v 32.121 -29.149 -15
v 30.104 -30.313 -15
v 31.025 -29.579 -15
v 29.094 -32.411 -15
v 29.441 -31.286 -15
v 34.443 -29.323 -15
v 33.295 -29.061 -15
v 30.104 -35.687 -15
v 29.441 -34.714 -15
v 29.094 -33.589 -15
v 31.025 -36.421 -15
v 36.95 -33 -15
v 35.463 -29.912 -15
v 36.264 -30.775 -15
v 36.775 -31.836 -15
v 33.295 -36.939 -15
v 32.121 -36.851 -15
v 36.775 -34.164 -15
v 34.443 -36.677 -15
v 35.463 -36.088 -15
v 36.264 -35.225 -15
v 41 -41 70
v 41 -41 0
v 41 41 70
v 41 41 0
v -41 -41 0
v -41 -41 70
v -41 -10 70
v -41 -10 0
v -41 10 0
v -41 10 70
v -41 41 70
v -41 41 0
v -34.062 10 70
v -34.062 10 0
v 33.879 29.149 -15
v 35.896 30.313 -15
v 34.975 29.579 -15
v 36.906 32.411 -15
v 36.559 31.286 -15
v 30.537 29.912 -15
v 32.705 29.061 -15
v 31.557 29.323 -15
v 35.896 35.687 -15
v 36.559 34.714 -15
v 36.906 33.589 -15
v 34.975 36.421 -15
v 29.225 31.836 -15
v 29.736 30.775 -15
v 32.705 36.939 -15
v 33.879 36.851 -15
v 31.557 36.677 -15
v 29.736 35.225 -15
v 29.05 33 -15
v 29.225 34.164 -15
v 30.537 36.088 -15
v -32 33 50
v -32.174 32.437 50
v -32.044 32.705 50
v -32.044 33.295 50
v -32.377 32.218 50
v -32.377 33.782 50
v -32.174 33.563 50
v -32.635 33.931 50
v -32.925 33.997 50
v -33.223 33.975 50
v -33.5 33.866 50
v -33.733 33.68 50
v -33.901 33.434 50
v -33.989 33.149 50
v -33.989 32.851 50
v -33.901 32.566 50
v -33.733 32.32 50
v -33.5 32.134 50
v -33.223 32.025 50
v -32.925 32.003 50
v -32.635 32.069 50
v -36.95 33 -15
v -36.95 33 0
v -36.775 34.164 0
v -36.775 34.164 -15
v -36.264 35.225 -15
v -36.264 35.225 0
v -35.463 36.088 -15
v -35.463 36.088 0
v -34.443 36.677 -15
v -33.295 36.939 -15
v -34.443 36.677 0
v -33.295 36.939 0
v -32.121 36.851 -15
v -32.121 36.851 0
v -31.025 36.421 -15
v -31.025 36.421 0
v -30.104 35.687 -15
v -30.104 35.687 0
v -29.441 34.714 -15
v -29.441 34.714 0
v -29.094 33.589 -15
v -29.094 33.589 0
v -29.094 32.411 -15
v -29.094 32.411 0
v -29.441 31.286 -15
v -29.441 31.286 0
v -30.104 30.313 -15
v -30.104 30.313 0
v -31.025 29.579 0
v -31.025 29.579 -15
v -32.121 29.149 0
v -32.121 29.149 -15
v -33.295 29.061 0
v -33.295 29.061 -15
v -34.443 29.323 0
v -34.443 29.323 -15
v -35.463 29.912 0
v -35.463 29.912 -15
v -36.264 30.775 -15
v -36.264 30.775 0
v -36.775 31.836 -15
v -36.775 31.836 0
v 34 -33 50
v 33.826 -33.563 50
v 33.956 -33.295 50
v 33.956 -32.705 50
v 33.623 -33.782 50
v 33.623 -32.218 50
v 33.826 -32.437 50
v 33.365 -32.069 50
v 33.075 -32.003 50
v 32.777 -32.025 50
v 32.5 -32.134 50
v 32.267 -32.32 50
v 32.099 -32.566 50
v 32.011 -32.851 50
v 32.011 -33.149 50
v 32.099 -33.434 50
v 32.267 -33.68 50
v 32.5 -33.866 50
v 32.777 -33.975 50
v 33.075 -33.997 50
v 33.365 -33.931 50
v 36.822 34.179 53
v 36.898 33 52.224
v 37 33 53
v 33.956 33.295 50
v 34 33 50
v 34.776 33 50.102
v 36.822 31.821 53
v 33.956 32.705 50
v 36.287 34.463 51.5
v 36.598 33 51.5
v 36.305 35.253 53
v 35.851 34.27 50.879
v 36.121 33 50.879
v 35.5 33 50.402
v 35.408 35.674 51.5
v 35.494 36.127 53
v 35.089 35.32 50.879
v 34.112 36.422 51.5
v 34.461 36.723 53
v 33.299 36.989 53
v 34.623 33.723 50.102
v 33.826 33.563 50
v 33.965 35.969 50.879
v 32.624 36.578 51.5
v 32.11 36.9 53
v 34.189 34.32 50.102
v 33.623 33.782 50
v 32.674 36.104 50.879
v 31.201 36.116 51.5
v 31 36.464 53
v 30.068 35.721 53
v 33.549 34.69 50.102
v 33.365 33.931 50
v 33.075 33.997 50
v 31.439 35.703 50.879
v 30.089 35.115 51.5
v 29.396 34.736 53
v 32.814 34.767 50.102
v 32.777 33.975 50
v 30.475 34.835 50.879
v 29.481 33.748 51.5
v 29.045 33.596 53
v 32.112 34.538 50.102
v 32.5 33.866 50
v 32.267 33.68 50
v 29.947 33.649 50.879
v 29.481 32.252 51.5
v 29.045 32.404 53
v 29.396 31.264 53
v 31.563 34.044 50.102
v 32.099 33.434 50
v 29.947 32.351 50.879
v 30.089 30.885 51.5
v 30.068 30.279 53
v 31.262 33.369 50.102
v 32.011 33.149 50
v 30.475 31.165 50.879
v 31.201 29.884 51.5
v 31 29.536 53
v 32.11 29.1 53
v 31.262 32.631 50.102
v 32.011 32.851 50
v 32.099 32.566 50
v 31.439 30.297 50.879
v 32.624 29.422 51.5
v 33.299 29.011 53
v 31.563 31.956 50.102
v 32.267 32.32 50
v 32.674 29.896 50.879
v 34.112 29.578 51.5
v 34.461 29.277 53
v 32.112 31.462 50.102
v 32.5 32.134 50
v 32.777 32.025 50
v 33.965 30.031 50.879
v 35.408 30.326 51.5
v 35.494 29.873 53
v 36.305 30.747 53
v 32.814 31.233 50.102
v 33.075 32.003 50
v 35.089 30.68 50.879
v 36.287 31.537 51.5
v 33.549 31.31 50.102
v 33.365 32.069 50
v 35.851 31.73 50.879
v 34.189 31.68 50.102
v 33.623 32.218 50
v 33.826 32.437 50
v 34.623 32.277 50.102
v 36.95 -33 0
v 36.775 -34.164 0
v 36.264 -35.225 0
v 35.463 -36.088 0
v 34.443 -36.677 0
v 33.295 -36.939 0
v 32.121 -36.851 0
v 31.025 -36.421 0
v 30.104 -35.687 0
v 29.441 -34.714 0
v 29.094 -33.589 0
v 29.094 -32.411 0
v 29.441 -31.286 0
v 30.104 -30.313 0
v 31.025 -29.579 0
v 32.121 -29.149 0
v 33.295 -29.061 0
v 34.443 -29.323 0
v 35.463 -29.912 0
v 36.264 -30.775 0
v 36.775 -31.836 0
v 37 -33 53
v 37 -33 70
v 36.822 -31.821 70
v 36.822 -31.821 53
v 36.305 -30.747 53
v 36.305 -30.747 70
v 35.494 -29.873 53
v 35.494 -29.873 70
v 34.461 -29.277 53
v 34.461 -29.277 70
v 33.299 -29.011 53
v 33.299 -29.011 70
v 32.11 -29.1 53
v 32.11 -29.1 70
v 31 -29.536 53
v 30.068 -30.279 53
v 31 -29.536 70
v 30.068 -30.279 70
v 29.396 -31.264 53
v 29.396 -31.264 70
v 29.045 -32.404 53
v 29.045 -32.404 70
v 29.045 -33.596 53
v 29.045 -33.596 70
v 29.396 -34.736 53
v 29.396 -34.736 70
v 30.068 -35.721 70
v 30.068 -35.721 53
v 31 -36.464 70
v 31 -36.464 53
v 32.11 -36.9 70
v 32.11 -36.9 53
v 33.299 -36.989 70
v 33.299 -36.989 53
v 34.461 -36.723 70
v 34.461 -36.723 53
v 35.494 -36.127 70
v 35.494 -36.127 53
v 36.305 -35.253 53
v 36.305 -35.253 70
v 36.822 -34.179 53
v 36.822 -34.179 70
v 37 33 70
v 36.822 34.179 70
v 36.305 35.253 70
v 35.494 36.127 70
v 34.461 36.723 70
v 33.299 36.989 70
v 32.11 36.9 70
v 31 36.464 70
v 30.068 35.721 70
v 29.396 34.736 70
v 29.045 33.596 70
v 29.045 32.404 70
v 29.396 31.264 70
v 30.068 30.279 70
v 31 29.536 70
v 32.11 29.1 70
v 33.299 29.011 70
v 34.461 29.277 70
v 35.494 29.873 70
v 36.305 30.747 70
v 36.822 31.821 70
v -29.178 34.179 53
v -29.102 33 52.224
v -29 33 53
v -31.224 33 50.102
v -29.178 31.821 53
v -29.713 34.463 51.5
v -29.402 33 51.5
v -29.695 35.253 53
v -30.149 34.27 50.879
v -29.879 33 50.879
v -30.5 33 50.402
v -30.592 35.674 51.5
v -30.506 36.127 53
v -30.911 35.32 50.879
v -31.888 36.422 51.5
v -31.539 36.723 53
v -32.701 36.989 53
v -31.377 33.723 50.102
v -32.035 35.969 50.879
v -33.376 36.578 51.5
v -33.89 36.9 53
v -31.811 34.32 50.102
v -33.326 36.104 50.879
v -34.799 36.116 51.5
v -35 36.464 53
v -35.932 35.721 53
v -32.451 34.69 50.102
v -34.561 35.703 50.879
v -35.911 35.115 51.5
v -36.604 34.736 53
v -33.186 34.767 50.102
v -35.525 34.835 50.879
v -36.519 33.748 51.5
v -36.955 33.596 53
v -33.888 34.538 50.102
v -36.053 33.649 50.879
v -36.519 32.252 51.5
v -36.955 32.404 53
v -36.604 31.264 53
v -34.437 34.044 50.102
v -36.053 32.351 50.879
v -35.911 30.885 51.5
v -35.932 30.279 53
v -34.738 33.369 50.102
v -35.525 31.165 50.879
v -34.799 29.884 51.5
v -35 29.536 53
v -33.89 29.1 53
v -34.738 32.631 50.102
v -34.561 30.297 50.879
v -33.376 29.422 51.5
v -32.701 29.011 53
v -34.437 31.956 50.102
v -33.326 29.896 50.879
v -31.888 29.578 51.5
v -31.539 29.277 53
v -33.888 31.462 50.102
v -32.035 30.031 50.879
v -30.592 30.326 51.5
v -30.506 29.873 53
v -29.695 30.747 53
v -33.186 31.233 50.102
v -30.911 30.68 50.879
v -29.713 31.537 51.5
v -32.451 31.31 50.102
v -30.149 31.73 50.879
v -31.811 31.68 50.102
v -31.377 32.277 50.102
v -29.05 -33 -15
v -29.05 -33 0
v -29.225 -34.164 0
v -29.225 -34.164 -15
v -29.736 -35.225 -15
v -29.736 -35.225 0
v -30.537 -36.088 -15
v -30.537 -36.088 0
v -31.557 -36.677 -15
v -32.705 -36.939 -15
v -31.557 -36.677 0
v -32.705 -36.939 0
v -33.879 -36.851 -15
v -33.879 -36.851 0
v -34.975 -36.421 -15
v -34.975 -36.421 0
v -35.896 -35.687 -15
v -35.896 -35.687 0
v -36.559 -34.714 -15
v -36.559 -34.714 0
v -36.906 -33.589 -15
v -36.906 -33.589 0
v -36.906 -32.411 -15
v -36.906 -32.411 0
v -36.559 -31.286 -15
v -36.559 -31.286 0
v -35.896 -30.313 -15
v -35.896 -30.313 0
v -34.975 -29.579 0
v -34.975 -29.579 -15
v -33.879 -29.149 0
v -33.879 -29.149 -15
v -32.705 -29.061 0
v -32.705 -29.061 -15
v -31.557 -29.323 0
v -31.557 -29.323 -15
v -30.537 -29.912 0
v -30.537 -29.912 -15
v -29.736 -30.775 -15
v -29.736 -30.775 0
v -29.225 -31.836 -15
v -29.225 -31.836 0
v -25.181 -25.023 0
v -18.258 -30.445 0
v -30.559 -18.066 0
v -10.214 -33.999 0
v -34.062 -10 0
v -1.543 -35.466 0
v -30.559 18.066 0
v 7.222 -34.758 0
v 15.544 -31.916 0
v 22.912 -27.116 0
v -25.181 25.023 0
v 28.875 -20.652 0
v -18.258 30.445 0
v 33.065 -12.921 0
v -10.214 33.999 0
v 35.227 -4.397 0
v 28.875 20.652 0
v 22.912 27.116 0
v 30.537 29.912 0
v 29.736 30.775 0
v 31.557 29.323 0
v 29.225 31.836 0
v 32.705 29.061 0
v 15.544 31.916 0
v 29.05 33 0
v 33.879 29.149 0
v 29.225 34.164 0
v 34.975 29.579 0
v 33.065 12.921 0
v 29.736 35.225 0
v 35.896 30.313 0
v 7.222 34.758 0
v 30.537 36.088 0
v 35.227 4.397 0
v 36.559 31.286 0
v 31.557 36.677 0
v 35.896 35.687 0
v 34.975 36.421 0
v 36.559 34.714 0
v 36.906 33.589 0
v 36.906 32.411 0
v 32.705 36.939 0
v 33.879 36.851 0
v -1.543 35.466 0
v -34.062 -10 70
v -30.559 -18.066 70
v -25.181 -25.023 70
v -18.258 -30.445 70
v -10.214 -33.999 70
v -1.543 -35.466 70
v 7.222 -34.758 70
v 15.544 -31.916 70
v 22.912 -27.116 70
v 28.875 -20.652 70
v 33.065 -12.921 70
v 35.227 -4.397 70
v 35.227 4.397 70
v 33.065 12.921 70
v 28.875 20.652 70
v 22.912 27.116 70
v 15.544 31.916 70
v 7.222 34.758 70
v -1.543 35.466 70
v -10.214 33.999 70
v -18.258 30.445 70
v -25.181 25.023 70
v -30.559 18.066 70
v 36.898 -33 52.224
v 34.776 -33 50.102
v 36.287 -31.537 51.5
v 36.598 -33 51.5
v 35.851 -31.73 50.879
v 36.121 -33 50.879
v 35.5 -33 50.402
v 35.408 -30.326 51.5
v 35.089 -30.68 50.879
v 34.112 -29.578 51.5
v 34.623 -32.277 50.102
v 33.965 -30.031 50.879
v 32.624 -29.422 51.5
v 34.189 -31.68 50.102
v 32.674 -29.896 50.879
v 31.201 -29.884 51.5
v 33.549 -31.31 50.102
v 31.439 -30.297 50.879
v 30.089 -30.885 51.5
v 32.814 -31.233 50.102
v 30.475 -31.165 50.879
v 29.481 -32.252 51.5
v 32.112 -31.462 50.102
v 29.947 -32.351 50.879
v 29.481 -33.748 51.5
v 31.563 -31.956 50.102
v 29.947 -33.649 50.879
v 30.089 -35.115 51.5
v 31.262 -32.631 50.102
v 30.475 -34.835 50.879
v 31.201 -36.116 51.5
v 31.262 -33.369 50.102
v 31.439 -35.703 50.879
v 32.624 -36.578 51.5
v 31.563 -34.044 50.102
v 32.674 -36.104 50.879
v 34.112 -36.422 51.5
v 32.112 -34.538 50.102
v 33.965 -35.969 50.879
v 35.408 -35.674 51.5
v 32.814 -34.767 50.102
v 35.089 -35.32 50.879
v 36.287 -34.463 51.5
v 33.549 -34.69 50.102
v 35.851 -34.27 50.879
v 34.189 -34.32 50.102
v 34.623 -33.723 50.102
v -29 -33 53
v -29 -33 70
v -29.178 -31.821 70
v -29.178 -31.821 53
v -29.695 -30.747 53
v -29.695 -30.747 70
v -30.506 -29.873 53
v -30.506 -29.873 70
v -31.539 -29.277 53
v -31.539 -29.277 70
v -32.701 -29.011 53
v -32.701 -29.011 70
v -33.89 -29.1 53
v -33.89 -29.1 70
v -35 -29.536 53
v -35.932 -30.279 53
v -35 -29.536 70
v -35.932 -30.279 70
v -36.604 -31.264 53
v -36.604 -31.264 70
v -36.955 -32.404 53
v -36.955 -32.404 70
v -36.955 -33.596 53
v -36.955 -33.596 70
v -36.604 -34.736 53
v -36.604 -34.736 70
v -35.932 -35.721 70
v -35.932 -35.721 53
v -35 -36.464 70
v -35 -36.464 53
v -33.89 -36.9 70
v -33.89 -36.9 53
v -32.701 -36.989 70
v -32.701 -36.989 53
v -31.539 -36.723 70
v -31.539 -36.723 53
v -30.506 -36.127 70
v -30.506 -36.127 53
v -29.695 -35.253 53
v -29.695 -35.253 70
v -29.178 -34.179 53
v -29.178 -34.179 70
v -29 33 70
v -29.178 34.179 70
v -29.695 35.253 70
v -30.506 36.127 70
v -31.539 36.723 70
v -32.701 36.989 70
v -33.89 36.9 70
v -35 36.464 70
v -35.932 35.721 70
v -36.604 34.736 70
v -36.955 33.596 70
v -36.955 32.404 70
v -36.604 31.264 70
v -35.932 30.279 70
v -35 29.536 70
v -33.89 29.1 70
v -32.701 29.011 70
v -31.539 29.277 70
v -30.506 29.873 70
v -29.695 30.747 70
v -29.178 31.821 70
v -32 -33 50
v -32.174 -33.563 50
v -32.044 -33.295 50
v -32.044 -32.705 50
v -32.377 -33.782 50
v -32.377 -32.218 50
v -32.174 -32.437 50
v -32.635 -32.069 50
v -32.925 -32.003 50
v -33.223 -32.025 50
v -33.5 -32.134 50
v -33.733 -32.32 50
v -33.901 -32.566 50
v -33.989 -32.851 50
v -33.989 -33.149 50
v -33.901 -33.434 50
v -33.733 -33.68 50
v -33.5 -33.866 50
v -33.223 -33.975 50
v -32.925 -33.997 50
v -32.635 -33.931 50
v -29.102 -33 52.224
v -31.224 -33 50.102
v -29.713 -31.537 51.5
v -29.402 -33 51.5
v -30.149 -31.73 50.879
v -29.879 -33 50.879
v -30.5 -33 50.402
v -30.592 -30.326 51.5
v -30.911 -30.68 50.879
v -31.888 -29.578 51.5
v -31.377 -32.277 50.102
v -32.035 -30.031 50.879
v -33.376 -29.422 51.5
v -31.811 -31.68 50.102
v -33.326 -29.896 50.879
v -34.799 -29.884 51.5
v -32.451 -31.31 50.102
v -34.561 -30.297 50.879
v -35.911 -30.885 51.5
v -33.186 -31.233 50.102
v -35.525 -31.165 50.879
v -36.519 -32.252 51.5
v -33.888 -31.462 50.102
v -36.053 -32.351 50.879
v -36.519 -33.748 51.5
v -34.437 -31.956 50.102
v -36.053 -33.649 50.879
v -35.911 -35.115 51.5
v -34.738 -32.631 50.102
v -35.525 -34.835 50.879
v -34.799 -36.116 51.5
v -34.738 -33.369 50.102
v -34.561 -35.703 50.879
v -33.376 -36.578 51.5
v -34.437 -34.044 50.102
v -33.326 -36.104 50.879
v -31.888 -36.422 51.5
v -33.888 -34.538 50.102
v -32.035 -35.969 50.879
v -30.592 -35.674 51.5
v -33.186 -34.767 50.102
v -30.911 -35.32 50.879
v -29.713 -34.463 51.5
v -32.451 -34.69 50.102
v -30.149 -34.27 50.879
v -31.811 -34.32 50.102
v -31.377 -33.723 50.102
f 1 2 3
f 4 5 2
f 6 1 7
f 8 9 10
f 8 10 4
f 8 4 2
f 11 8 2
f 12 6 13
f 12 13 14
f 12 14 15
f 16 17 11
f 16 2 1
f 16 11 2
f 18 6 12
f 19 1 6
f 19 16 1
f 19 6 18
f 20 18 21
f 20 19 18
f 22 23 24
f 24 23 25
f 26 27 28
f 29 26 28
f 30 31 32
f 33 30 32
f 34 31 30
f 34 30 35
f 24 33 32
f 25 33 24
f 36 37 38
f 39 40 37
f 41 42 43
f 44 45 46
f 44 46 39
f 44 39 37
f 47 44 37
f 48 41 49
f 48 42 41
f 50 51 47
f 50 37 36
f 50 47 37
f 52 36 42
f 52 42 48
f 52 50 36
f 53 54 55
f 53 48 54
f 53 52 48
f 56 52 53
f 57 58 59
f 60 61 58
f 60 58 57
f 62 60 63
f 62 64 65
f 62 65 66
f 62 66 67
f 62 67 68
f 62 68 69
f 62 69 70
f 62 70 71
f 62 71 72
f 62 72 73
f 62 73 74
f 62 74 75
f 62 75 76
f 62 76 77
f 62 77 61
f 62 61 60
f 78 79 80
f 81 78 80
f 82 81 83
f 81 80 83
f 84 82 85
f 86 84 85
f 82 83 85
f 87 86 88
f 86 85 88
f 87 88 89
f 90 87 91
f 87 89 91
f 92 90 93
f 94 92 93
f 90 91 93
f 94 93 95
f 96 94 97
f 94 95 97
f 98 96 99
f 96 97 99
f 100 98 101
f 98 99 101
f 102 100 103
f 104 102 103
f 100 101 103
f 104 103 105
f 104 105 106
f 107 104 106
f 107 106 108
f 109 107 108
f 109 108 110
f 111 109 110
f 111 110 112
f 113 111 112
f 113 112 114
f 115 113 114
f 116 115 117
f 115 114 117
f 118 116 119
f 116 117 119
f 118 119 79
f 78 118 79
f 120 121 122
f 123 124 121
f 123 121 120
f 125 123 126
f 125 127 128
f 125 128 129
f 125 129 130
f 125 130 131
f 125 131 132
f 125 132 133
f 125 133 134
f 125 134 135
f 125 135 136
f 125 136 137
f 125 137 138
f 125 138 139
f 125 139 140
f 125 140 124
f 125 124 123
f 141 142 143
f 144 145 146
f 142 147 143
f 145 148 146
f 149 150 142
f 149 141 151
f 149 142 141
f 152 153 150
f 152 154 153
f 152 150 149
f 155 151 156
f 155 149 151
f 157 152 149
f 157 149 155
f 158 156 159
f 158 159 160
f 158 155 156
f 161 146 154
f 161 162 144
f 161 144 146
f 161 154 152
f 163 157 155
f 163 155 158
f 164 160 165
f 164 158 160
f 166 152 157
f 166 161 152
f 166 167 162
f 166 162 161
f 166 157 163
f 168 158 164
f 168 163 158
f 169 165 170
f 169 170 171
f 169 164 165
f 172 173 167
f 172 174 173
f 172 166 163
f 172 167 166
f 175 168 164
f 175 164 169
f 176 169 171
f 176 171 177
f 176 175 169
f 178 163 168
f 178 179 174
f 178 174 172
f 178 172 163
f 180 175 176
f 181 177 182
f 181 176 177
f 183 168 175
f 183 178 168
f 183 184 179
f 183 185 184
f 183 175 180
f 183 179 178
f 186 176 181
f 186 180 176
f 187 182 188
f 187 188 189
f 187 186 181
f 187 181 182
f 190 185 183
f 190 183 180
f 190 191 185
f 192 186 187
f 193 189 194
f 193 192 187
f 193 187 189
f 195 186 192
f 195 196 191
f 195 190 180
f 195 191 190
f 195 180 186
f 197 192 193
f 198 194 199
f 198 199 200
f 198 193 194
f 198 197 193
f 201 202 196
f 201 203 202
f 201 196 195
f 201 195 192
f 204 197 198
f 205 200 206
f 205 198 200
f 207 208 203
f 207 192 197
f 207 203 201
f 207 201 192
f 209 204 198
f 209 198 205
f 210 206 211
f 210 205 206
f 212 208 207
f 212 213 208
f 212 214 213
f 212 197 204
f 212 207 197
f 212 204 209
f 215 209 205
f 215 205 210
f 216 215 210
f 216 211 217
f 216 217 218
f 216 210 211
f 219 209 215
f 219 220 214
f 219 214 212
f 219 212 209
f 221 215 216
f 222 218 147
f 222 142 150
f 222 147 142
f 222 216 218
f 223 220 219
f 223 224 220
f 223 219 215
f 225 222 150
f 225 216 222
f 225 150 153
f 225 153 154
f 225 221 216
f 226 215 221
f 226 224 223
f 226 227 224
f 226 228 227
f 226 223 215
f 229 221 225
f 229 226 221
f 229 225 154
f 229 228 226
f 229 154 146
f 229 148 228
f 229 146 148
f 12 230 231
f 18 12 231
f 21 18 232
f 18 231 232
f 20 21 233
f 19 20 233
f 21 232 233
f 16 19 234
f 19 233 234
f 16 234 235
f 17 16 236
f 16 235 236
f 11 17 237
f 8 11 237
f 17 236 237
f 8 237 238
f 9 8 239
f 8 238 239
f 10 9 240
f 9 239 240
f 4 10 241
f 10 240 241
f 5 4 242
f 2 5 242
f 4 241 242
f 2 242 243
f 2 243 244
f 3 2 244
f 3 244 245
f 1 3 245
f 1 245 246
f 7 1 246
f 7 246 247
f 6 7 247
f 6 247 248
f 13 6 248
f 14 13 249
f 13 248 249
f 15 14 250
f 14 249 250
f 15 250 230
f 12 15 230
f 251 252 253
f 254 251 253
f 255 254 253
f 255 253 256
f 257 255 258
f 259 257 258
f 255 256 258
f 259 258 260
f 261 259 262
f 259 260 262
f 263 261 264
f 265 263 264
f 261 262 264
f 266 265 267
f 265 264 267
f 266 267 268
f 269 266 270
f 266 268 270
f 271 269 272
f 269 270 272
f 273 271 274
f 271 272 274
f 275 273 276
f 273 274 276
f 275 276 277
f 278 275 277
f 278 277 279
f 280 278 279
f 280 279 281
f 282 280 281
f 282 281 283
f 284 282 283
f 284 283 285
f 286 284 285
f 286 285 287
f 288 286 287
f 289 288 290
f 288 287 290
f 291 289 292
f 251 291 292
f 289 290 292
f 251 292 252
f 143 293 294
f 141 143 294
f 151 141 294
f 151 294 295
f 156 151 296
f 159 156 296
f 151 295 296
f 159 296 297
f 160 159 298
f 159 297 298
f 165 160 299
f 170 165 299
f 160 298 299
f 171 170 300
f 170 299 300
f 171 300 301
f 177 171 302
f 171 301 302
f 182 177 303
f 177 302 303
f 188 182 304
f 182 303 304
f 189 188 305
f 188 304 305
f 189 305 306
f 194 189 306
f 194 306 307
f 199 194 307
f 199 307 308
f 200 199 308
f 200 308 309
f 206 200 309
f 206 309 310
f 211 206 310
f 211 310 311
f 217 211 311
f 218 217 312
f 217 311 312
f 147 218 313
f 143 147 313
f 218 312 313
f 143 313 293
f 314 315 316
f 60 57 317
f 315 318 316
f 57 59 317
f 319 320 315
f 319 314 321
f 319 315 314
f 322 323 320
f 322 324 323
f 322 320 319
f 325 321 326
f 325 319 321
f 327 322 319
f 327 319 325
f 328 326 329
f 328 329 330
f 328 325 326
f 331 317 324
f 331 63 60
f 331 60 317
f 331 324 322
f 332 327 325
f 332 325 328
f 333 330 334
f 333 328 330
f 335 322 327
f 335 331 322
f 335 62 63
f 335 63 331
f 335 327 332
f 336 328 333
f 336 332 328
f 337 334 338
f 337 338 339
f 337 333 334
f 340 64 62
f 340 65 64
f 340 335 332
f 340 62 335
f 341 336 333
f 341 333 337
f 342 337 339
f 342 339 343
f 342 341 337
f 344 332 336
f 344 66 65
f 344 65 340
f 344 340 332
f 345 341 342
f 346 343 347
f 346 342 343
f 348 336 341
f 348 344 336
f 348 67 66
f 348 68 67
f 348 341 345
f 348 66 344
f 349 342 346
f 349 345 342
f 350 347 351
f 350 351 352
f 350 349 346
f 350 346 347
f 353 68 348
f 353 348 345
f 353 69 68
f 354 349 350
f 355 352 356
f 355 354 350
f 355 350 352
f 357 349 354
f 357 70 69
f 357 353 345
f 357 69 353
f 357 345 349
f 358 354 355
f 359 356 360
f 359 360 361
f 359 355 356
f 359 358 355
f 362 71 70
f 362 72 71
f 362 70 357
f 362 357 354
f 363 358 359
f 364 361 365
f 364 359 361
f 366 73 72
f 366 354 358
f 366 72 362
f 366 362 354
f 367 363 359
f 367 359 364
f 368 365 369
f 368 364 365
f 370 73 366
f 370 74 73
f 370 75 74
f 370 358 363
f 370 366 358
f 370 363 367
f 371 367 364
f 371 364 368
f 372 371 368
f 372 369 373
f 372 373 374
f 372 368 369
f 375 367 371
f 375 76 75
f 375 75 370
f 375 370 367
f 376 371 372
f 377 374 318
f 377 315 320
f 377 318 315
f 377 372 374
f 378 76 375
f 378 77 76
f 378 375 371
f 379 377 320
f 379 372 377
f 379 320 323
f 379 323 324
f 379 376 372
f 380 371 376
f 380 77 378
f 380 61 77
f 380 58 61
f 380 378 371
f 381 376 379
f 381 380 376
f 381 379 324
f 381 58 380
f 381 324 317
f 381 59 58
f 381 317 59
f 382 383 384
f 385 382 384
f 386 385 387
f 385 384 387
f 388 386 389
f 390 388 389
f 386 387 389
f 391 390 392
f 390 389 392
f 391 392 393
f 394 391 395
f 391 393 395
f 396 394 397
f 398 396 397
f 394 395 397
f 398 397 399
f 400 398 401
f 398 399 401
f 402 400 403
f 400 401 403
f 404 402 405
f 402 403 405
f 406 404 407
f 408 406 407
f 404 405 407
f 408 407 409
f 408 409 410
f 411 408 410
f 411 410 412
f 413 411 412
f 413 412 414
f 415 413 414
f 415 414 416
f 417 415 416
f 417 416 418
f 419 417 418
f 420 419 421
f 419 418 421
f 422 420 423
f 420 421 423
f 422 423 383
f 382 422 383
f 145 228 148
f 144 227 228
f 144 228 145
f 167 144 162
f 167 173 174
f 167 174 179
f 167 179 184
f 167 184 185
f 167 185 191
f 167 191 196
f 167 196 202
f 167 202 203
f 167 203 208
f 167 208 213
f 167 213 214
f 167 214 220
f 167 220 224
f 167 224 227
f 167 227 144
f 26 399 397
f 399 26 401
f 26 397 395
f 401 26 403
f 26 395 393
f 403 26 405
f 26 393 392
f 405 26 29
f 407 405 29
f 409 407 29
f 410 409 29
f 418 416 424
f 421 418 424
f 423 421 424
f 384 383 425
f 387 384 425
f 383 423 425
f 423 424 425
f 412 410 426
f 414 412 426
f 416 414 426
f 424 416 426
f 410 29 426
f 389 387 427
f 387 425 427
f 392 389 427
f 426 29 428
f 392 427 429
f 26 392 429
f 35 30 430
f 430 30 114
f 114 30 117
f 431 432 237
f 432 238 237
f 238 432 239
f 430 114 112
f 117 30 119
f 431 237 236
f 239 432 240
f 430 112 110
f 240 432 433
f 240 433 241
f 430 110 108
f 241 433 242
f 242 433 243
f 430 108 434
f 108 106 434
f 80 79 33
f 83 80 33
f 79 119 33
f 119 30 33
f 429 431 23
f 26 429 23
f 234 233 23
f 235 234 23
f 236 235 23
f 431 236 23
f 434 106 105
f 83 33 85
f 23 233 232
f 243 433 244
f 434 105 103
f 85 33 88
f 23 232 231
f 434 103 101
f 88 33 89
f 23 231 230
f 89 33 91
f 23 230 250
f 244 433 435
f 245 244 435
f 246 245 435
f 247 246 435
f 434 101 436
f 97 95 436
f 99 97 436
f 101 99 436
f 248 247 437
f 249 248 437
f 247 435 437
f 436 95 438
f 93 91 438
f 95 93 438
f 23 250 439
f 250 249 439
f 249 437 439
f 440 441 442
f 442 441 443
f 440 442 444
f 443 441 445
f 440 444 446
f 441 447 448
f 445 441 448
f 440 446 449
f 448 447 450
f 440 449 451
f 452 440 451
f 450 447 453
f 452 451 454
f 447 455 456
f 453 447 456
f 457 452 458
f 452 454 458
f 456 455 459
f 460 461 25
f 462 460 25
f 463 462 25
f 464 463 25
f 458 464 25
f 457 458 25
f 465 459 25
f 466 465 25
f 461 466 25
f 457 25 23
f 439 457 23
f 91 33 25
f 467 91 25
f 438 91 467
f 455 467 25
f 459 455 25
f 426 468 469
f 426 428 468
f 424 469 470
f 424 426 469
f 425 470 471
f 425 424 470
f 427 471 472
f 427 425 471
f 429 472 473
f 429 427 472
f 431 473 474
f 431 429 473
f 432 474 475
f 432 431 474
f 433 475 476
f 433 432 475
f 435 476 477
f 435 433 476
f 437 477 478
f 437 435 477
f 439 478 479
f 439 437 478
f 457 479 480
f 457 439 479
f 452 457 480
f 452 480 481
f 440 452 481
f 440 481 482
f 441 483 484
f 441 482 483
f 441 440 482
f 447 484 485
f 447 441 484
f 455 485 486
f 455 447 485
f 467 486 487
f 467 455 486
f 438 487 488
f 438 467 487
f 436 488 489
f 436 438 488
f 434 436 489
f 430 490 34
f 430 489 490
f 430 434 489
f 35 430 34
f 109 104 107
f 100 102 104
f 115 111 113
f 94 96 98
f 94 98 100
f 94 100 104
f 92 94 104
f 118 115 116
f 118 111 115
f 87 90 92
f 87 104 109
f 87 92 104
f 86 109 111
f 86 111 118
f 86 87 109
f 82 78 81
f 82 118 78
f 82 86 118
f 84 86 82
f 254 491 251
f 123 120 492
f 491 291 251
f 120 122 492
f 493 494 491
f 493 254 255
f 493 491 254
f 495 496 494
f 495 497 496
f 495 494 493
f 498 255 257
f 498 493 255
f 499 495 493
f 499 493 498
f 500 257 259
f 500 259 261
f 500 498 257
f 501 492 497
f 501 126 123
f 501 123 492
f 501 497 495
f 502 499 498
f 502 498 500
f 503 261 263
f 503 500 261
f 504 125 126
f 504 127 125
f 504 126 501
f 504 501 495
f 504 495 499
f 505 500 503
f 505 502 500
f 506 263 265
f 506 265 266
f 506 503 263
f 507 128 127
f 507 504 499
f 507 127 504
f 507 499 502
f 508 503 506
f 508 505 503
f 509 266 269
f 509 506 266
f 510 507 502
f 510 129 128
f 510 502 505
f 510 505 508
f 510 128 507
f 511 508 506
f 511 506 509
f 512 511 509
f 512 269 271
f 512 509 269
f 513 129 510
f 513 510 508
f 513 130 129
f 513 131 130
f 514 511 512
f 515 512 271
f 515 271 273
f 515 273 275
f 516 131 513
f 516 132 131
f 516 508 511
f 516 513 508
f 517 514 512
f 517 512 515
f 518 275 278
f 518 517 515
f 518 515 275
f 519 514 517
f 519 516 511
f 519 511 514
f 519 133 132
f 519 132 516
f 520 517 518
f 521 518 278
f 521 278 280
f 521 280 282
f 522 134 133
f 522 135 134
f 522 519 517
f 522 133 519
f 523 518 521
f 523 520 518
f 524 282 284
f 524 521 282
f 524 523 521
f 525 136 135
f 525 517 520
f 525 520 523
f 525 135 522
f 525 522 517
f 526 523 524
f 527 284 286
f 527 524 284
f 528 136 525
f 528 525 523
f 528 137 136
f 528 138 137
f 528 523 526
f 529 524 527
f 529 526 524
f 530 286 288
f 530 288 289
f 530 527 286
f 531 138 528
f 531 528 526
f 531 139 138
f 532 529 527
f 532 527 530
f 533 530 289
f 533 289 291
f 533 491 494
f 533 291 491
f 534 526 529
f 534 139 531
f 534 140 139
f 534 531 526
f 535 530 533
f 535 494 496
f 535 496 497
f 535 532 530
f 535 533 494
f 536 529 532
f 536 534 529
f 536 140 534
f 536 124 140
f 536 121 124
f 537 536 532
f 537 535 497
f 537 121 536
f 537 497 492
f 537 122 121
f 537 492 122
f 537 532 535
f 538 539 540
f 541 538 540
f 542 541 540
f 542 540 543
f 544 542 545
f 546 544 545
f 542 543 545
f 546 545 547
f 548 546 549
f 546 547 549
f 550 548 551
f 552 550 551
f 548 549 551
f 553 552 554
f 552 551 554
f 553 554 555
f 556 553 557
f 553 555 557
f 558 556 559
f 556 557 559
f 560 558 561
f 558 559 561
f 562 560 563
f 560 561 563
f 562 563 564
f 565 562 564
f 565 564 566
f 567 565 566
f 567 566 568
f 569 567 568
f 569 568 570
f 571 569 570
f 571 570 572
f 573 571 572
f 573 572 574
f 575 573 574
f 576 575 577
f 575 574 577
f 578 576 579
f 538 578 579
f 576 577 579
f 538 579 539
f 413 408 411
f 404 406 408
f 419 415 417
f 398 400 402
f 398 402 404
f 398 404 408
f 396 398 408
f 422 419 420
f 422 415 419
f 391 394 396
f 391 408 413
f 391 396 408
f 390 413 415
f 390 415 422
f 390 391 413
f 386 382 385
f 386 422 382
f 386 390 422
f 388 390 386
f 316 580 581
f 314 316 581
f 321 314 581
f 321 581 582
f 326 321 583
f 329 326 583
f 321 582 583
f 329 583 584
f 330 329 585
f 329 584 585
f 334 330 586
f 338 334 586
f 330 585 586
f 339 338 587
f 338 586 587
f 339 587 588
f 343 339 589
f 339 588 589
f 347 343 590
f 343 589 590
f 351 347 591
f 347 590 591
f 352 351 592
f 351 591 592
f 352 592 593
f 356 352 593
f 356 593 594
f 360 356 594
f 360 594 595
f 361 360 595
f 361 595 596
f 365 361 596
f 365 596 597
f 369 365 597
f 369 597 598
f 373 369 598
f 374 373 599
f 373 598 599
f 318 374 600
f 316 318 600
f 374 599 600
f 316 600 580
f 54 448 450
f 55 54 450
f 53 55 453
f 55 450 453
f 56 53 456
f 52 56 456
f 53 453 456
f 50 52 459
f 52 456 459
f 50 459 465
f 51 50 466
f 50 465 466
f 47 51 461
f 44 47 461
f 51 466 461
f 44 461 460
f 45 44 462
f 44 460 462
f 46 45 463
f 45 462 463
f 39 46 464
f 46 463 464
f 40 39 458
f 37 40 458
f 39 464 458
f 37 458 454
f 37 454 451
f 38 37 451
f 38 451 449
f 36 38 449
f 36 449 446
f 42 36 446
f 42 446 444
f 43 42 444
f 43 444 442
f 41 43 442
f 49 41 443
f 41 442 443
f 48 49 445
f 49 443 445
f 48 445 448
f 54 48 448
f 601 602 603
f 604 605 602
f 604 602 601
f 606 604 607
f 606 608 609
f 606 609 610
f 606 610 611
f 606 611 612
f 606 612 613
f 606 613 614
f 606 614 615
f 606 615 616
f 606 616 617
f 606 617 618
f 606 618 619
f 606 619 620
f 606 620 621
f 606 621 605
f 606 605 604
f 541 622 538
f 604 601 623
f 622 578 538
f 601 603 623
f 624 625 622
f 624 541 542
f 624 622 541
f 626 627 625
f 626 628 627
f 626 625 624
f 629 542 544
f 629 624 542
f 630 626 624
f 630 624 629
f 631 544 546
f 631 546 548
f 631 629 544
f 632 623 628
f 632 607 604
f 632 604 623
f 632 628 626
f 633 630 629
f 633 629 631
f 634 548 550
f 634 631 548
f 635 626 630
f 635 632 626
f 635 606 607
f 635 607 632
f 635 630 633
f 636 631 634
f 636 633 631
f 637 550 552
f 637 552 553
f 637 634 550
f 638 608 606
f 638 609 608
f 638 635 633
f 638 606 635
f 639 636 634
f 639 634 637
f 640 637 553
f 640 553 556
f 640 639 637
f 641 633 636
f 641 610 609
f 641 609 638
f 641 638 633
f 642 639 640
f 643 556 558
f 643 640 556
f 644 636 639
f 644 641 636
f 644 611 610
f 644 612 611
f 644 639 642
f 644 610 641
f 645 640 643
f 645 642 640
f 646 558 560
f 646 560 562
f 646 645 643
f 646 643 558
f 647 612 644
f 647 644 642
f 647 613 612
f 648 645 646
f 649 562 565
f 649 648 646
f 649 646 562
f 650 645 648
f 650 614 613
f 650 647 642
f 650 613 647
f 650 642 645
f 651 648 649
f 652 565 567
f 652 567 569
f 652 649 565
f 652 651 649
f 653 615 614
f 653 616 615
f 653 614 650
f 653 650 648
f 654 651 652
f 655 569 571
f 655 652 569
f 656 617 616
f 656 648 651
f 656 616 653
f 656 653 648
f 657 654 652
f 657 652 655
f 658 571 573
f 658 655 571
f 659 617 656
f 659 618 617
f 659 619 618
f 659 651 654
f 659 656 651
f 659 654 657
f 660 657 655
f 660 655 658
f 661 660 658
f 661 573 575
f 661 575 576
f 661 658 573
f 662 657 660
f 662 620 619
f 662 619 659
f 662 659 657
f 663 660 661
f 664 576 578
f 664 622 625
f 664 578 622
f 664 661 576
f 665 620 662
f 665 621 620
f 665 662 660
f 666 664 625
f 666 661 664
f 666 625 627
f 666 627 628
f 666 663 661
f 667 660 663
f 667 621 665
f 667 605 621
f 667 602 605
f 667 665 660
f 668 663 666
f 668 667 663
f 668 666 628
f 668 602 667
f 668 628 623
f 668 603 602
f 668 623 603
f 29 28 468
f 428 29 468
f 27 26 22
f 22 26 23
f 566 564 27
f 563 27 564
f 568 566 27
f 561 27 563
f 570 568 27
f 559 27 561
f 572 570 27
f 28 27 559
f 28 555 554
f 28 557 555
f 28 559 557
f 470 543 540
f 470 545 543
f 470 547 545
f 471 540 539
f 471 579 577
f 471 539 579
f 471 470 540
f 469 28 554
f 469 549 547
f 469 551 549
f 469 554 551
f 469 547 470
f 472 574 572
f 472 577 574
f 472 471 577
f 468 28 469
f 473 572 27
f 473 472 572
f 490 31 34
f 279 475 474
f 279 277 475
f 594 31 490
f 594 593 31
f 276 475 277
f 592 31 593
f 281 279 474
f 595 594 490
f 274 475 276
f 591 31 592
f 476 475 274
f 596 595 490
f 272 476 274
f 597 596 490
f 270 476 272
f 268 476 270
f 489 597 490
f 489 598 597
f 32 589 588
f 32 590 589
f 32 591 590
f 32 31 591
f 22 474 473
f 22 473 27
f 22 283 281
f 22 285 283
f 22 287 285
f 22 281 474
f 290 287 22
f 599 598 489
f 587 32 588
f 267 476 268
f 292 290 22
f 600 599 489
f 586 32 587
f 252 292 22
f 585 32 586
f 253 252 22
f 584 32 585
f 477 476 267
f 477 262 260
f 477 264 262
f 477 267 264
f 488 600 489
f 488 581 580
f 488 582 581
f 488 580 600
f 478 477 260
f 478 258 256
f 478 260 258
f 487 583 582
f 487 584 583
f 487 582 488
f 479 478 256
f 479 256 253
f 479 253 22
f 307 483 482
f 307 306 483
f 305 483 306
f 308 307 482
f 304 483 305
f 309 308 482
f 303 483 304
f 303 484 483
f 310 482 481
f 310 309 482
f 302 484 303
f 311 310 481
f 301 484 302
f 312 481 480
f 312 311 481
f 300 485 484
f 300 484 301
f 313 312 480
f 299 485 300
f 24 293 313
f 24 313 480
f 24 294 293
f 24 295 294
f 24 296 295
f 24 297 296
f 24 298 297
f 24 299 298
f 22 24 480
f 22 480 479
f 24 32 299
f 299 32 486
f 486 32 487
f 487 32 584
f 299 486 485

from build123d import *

# Parameters (mm, degrees)
SKETCH_1_W          = 82
SKETCH_1_H          = 82
SKETCH_1_R          = 35.5
EXTRUDE_1_DEPTH     = 70
SKETCH_4_R          = 4
CUT_EXTRUDE_2_DEPTH = 20
FILLET_2_R          = 3
FILLET_3_R          = 3
FILLET_4_R          = 3
FILLET_5_R          = 3
CUT_EXTRUDE_3_REACH = 92.896
SKETCH_3_W          = 8
SKETCH_3_H          = 20
SKETCH_5_R          = 3.95
EXTRUDE_2_DEPTH     = 15


with BuildPart() as part:
    # 草圖1 → 填料-伸長1 (new body)
    with BuildSketch(Plane.XY):
        Rectangle(SKETCH_1_W, SKETCH_1_H)
        Circle(SKETCH_1_R, mode=Mode.SUBTRACT)
    extrude(amount=EXTRUDE_1_DEPTH)

    # 草圖4 → 除料-伸長2 (cut)
    with BuildSketch(Plane.XY.offset(70)):
        with Locations((-33, 33)):
            Circle(SKETCH_4_R)
        with Locations((33, 33)):
            Circle(SKETCH_4_R)
        with Locations((33, -33)):
            Circle(SKETCH_4_R)
        with Locations((-33, -33)):
            Circle(SKETCH_4_R)
    extrude(amount=-CUT_EXTRUDE_2_DEPTH, mode=Mode.SUBTRACT)

    # 圓角2
    fillet_2_edges = [part.edges().sort_by_distance(p)[0] for p in [
        (-37, 33, 50),
    ]]
    fillet(fillet_2_edges, radius=FILLET_2_R)

    # 圓角3
    fillet_3_edges = [part.edges().sort_by_distance(p)[0] for p in [
        (29, 33, 50),
    ]]
    fillet(fillet_3_edges, radius=FILLET_3_R)

    # 圓角4
    fillet_4_edges = [part.edges().sort_by_distance(p)[0] for p in [
        (-37, -33, 50),
    ]]
    fillet(fillet_4_edges, radius=FILLET_4_R)

    # 圓角5
    fillet_5_edges = [part.edges().sort_by_distance(p)[0] for p in [
        (29, -33, 50),
    ]]
    fillet(fillet_5_edges, radius=FILLET_5_R)

    # 草圖3 → 除料-伸長3 (cut, up to next)
    with BuildSketch(Plane.XY.offset(70), mode=Mode.PRIVATE) as cut_extrude_3_sk1:
        with Locations((-37, 0)):
            Rectangle(SKETCH_3_W, SKETCH_3_H)
    cut_extrude_3_tool1 = extrude(cut_extrude_3_sk1.sketch, amount=-CUT_EXTRUDE_3_REACH, mode=Mode.PRIVATE) & part.part
    add(cut_extrude_3_tool1.solids().sort_by_distance((-37, 0, 70))[0], mode=Mode.SUBTRACT)

    # 草圖5 → 填料-伸長2 (add)
    with BuildSketch(Plane(origin=(0, 0, 0), x_dir=(-1, 0, 0), z_dir=(0, 0, -1))):
        with Locations((33, 33)):
            Circle(SKETCH_5_R)
        with Locations((-33, 33)):
            Circle(SKETCH_5_R)
        with Locations((33, -33)):
            Circle(SKETCH_5_R)
        with Locations((-33, -33)):
            Circle(SKETCH_5_R)
    extrude(amount=EXTRUDE_2_DEPTH)


solid = part.part
